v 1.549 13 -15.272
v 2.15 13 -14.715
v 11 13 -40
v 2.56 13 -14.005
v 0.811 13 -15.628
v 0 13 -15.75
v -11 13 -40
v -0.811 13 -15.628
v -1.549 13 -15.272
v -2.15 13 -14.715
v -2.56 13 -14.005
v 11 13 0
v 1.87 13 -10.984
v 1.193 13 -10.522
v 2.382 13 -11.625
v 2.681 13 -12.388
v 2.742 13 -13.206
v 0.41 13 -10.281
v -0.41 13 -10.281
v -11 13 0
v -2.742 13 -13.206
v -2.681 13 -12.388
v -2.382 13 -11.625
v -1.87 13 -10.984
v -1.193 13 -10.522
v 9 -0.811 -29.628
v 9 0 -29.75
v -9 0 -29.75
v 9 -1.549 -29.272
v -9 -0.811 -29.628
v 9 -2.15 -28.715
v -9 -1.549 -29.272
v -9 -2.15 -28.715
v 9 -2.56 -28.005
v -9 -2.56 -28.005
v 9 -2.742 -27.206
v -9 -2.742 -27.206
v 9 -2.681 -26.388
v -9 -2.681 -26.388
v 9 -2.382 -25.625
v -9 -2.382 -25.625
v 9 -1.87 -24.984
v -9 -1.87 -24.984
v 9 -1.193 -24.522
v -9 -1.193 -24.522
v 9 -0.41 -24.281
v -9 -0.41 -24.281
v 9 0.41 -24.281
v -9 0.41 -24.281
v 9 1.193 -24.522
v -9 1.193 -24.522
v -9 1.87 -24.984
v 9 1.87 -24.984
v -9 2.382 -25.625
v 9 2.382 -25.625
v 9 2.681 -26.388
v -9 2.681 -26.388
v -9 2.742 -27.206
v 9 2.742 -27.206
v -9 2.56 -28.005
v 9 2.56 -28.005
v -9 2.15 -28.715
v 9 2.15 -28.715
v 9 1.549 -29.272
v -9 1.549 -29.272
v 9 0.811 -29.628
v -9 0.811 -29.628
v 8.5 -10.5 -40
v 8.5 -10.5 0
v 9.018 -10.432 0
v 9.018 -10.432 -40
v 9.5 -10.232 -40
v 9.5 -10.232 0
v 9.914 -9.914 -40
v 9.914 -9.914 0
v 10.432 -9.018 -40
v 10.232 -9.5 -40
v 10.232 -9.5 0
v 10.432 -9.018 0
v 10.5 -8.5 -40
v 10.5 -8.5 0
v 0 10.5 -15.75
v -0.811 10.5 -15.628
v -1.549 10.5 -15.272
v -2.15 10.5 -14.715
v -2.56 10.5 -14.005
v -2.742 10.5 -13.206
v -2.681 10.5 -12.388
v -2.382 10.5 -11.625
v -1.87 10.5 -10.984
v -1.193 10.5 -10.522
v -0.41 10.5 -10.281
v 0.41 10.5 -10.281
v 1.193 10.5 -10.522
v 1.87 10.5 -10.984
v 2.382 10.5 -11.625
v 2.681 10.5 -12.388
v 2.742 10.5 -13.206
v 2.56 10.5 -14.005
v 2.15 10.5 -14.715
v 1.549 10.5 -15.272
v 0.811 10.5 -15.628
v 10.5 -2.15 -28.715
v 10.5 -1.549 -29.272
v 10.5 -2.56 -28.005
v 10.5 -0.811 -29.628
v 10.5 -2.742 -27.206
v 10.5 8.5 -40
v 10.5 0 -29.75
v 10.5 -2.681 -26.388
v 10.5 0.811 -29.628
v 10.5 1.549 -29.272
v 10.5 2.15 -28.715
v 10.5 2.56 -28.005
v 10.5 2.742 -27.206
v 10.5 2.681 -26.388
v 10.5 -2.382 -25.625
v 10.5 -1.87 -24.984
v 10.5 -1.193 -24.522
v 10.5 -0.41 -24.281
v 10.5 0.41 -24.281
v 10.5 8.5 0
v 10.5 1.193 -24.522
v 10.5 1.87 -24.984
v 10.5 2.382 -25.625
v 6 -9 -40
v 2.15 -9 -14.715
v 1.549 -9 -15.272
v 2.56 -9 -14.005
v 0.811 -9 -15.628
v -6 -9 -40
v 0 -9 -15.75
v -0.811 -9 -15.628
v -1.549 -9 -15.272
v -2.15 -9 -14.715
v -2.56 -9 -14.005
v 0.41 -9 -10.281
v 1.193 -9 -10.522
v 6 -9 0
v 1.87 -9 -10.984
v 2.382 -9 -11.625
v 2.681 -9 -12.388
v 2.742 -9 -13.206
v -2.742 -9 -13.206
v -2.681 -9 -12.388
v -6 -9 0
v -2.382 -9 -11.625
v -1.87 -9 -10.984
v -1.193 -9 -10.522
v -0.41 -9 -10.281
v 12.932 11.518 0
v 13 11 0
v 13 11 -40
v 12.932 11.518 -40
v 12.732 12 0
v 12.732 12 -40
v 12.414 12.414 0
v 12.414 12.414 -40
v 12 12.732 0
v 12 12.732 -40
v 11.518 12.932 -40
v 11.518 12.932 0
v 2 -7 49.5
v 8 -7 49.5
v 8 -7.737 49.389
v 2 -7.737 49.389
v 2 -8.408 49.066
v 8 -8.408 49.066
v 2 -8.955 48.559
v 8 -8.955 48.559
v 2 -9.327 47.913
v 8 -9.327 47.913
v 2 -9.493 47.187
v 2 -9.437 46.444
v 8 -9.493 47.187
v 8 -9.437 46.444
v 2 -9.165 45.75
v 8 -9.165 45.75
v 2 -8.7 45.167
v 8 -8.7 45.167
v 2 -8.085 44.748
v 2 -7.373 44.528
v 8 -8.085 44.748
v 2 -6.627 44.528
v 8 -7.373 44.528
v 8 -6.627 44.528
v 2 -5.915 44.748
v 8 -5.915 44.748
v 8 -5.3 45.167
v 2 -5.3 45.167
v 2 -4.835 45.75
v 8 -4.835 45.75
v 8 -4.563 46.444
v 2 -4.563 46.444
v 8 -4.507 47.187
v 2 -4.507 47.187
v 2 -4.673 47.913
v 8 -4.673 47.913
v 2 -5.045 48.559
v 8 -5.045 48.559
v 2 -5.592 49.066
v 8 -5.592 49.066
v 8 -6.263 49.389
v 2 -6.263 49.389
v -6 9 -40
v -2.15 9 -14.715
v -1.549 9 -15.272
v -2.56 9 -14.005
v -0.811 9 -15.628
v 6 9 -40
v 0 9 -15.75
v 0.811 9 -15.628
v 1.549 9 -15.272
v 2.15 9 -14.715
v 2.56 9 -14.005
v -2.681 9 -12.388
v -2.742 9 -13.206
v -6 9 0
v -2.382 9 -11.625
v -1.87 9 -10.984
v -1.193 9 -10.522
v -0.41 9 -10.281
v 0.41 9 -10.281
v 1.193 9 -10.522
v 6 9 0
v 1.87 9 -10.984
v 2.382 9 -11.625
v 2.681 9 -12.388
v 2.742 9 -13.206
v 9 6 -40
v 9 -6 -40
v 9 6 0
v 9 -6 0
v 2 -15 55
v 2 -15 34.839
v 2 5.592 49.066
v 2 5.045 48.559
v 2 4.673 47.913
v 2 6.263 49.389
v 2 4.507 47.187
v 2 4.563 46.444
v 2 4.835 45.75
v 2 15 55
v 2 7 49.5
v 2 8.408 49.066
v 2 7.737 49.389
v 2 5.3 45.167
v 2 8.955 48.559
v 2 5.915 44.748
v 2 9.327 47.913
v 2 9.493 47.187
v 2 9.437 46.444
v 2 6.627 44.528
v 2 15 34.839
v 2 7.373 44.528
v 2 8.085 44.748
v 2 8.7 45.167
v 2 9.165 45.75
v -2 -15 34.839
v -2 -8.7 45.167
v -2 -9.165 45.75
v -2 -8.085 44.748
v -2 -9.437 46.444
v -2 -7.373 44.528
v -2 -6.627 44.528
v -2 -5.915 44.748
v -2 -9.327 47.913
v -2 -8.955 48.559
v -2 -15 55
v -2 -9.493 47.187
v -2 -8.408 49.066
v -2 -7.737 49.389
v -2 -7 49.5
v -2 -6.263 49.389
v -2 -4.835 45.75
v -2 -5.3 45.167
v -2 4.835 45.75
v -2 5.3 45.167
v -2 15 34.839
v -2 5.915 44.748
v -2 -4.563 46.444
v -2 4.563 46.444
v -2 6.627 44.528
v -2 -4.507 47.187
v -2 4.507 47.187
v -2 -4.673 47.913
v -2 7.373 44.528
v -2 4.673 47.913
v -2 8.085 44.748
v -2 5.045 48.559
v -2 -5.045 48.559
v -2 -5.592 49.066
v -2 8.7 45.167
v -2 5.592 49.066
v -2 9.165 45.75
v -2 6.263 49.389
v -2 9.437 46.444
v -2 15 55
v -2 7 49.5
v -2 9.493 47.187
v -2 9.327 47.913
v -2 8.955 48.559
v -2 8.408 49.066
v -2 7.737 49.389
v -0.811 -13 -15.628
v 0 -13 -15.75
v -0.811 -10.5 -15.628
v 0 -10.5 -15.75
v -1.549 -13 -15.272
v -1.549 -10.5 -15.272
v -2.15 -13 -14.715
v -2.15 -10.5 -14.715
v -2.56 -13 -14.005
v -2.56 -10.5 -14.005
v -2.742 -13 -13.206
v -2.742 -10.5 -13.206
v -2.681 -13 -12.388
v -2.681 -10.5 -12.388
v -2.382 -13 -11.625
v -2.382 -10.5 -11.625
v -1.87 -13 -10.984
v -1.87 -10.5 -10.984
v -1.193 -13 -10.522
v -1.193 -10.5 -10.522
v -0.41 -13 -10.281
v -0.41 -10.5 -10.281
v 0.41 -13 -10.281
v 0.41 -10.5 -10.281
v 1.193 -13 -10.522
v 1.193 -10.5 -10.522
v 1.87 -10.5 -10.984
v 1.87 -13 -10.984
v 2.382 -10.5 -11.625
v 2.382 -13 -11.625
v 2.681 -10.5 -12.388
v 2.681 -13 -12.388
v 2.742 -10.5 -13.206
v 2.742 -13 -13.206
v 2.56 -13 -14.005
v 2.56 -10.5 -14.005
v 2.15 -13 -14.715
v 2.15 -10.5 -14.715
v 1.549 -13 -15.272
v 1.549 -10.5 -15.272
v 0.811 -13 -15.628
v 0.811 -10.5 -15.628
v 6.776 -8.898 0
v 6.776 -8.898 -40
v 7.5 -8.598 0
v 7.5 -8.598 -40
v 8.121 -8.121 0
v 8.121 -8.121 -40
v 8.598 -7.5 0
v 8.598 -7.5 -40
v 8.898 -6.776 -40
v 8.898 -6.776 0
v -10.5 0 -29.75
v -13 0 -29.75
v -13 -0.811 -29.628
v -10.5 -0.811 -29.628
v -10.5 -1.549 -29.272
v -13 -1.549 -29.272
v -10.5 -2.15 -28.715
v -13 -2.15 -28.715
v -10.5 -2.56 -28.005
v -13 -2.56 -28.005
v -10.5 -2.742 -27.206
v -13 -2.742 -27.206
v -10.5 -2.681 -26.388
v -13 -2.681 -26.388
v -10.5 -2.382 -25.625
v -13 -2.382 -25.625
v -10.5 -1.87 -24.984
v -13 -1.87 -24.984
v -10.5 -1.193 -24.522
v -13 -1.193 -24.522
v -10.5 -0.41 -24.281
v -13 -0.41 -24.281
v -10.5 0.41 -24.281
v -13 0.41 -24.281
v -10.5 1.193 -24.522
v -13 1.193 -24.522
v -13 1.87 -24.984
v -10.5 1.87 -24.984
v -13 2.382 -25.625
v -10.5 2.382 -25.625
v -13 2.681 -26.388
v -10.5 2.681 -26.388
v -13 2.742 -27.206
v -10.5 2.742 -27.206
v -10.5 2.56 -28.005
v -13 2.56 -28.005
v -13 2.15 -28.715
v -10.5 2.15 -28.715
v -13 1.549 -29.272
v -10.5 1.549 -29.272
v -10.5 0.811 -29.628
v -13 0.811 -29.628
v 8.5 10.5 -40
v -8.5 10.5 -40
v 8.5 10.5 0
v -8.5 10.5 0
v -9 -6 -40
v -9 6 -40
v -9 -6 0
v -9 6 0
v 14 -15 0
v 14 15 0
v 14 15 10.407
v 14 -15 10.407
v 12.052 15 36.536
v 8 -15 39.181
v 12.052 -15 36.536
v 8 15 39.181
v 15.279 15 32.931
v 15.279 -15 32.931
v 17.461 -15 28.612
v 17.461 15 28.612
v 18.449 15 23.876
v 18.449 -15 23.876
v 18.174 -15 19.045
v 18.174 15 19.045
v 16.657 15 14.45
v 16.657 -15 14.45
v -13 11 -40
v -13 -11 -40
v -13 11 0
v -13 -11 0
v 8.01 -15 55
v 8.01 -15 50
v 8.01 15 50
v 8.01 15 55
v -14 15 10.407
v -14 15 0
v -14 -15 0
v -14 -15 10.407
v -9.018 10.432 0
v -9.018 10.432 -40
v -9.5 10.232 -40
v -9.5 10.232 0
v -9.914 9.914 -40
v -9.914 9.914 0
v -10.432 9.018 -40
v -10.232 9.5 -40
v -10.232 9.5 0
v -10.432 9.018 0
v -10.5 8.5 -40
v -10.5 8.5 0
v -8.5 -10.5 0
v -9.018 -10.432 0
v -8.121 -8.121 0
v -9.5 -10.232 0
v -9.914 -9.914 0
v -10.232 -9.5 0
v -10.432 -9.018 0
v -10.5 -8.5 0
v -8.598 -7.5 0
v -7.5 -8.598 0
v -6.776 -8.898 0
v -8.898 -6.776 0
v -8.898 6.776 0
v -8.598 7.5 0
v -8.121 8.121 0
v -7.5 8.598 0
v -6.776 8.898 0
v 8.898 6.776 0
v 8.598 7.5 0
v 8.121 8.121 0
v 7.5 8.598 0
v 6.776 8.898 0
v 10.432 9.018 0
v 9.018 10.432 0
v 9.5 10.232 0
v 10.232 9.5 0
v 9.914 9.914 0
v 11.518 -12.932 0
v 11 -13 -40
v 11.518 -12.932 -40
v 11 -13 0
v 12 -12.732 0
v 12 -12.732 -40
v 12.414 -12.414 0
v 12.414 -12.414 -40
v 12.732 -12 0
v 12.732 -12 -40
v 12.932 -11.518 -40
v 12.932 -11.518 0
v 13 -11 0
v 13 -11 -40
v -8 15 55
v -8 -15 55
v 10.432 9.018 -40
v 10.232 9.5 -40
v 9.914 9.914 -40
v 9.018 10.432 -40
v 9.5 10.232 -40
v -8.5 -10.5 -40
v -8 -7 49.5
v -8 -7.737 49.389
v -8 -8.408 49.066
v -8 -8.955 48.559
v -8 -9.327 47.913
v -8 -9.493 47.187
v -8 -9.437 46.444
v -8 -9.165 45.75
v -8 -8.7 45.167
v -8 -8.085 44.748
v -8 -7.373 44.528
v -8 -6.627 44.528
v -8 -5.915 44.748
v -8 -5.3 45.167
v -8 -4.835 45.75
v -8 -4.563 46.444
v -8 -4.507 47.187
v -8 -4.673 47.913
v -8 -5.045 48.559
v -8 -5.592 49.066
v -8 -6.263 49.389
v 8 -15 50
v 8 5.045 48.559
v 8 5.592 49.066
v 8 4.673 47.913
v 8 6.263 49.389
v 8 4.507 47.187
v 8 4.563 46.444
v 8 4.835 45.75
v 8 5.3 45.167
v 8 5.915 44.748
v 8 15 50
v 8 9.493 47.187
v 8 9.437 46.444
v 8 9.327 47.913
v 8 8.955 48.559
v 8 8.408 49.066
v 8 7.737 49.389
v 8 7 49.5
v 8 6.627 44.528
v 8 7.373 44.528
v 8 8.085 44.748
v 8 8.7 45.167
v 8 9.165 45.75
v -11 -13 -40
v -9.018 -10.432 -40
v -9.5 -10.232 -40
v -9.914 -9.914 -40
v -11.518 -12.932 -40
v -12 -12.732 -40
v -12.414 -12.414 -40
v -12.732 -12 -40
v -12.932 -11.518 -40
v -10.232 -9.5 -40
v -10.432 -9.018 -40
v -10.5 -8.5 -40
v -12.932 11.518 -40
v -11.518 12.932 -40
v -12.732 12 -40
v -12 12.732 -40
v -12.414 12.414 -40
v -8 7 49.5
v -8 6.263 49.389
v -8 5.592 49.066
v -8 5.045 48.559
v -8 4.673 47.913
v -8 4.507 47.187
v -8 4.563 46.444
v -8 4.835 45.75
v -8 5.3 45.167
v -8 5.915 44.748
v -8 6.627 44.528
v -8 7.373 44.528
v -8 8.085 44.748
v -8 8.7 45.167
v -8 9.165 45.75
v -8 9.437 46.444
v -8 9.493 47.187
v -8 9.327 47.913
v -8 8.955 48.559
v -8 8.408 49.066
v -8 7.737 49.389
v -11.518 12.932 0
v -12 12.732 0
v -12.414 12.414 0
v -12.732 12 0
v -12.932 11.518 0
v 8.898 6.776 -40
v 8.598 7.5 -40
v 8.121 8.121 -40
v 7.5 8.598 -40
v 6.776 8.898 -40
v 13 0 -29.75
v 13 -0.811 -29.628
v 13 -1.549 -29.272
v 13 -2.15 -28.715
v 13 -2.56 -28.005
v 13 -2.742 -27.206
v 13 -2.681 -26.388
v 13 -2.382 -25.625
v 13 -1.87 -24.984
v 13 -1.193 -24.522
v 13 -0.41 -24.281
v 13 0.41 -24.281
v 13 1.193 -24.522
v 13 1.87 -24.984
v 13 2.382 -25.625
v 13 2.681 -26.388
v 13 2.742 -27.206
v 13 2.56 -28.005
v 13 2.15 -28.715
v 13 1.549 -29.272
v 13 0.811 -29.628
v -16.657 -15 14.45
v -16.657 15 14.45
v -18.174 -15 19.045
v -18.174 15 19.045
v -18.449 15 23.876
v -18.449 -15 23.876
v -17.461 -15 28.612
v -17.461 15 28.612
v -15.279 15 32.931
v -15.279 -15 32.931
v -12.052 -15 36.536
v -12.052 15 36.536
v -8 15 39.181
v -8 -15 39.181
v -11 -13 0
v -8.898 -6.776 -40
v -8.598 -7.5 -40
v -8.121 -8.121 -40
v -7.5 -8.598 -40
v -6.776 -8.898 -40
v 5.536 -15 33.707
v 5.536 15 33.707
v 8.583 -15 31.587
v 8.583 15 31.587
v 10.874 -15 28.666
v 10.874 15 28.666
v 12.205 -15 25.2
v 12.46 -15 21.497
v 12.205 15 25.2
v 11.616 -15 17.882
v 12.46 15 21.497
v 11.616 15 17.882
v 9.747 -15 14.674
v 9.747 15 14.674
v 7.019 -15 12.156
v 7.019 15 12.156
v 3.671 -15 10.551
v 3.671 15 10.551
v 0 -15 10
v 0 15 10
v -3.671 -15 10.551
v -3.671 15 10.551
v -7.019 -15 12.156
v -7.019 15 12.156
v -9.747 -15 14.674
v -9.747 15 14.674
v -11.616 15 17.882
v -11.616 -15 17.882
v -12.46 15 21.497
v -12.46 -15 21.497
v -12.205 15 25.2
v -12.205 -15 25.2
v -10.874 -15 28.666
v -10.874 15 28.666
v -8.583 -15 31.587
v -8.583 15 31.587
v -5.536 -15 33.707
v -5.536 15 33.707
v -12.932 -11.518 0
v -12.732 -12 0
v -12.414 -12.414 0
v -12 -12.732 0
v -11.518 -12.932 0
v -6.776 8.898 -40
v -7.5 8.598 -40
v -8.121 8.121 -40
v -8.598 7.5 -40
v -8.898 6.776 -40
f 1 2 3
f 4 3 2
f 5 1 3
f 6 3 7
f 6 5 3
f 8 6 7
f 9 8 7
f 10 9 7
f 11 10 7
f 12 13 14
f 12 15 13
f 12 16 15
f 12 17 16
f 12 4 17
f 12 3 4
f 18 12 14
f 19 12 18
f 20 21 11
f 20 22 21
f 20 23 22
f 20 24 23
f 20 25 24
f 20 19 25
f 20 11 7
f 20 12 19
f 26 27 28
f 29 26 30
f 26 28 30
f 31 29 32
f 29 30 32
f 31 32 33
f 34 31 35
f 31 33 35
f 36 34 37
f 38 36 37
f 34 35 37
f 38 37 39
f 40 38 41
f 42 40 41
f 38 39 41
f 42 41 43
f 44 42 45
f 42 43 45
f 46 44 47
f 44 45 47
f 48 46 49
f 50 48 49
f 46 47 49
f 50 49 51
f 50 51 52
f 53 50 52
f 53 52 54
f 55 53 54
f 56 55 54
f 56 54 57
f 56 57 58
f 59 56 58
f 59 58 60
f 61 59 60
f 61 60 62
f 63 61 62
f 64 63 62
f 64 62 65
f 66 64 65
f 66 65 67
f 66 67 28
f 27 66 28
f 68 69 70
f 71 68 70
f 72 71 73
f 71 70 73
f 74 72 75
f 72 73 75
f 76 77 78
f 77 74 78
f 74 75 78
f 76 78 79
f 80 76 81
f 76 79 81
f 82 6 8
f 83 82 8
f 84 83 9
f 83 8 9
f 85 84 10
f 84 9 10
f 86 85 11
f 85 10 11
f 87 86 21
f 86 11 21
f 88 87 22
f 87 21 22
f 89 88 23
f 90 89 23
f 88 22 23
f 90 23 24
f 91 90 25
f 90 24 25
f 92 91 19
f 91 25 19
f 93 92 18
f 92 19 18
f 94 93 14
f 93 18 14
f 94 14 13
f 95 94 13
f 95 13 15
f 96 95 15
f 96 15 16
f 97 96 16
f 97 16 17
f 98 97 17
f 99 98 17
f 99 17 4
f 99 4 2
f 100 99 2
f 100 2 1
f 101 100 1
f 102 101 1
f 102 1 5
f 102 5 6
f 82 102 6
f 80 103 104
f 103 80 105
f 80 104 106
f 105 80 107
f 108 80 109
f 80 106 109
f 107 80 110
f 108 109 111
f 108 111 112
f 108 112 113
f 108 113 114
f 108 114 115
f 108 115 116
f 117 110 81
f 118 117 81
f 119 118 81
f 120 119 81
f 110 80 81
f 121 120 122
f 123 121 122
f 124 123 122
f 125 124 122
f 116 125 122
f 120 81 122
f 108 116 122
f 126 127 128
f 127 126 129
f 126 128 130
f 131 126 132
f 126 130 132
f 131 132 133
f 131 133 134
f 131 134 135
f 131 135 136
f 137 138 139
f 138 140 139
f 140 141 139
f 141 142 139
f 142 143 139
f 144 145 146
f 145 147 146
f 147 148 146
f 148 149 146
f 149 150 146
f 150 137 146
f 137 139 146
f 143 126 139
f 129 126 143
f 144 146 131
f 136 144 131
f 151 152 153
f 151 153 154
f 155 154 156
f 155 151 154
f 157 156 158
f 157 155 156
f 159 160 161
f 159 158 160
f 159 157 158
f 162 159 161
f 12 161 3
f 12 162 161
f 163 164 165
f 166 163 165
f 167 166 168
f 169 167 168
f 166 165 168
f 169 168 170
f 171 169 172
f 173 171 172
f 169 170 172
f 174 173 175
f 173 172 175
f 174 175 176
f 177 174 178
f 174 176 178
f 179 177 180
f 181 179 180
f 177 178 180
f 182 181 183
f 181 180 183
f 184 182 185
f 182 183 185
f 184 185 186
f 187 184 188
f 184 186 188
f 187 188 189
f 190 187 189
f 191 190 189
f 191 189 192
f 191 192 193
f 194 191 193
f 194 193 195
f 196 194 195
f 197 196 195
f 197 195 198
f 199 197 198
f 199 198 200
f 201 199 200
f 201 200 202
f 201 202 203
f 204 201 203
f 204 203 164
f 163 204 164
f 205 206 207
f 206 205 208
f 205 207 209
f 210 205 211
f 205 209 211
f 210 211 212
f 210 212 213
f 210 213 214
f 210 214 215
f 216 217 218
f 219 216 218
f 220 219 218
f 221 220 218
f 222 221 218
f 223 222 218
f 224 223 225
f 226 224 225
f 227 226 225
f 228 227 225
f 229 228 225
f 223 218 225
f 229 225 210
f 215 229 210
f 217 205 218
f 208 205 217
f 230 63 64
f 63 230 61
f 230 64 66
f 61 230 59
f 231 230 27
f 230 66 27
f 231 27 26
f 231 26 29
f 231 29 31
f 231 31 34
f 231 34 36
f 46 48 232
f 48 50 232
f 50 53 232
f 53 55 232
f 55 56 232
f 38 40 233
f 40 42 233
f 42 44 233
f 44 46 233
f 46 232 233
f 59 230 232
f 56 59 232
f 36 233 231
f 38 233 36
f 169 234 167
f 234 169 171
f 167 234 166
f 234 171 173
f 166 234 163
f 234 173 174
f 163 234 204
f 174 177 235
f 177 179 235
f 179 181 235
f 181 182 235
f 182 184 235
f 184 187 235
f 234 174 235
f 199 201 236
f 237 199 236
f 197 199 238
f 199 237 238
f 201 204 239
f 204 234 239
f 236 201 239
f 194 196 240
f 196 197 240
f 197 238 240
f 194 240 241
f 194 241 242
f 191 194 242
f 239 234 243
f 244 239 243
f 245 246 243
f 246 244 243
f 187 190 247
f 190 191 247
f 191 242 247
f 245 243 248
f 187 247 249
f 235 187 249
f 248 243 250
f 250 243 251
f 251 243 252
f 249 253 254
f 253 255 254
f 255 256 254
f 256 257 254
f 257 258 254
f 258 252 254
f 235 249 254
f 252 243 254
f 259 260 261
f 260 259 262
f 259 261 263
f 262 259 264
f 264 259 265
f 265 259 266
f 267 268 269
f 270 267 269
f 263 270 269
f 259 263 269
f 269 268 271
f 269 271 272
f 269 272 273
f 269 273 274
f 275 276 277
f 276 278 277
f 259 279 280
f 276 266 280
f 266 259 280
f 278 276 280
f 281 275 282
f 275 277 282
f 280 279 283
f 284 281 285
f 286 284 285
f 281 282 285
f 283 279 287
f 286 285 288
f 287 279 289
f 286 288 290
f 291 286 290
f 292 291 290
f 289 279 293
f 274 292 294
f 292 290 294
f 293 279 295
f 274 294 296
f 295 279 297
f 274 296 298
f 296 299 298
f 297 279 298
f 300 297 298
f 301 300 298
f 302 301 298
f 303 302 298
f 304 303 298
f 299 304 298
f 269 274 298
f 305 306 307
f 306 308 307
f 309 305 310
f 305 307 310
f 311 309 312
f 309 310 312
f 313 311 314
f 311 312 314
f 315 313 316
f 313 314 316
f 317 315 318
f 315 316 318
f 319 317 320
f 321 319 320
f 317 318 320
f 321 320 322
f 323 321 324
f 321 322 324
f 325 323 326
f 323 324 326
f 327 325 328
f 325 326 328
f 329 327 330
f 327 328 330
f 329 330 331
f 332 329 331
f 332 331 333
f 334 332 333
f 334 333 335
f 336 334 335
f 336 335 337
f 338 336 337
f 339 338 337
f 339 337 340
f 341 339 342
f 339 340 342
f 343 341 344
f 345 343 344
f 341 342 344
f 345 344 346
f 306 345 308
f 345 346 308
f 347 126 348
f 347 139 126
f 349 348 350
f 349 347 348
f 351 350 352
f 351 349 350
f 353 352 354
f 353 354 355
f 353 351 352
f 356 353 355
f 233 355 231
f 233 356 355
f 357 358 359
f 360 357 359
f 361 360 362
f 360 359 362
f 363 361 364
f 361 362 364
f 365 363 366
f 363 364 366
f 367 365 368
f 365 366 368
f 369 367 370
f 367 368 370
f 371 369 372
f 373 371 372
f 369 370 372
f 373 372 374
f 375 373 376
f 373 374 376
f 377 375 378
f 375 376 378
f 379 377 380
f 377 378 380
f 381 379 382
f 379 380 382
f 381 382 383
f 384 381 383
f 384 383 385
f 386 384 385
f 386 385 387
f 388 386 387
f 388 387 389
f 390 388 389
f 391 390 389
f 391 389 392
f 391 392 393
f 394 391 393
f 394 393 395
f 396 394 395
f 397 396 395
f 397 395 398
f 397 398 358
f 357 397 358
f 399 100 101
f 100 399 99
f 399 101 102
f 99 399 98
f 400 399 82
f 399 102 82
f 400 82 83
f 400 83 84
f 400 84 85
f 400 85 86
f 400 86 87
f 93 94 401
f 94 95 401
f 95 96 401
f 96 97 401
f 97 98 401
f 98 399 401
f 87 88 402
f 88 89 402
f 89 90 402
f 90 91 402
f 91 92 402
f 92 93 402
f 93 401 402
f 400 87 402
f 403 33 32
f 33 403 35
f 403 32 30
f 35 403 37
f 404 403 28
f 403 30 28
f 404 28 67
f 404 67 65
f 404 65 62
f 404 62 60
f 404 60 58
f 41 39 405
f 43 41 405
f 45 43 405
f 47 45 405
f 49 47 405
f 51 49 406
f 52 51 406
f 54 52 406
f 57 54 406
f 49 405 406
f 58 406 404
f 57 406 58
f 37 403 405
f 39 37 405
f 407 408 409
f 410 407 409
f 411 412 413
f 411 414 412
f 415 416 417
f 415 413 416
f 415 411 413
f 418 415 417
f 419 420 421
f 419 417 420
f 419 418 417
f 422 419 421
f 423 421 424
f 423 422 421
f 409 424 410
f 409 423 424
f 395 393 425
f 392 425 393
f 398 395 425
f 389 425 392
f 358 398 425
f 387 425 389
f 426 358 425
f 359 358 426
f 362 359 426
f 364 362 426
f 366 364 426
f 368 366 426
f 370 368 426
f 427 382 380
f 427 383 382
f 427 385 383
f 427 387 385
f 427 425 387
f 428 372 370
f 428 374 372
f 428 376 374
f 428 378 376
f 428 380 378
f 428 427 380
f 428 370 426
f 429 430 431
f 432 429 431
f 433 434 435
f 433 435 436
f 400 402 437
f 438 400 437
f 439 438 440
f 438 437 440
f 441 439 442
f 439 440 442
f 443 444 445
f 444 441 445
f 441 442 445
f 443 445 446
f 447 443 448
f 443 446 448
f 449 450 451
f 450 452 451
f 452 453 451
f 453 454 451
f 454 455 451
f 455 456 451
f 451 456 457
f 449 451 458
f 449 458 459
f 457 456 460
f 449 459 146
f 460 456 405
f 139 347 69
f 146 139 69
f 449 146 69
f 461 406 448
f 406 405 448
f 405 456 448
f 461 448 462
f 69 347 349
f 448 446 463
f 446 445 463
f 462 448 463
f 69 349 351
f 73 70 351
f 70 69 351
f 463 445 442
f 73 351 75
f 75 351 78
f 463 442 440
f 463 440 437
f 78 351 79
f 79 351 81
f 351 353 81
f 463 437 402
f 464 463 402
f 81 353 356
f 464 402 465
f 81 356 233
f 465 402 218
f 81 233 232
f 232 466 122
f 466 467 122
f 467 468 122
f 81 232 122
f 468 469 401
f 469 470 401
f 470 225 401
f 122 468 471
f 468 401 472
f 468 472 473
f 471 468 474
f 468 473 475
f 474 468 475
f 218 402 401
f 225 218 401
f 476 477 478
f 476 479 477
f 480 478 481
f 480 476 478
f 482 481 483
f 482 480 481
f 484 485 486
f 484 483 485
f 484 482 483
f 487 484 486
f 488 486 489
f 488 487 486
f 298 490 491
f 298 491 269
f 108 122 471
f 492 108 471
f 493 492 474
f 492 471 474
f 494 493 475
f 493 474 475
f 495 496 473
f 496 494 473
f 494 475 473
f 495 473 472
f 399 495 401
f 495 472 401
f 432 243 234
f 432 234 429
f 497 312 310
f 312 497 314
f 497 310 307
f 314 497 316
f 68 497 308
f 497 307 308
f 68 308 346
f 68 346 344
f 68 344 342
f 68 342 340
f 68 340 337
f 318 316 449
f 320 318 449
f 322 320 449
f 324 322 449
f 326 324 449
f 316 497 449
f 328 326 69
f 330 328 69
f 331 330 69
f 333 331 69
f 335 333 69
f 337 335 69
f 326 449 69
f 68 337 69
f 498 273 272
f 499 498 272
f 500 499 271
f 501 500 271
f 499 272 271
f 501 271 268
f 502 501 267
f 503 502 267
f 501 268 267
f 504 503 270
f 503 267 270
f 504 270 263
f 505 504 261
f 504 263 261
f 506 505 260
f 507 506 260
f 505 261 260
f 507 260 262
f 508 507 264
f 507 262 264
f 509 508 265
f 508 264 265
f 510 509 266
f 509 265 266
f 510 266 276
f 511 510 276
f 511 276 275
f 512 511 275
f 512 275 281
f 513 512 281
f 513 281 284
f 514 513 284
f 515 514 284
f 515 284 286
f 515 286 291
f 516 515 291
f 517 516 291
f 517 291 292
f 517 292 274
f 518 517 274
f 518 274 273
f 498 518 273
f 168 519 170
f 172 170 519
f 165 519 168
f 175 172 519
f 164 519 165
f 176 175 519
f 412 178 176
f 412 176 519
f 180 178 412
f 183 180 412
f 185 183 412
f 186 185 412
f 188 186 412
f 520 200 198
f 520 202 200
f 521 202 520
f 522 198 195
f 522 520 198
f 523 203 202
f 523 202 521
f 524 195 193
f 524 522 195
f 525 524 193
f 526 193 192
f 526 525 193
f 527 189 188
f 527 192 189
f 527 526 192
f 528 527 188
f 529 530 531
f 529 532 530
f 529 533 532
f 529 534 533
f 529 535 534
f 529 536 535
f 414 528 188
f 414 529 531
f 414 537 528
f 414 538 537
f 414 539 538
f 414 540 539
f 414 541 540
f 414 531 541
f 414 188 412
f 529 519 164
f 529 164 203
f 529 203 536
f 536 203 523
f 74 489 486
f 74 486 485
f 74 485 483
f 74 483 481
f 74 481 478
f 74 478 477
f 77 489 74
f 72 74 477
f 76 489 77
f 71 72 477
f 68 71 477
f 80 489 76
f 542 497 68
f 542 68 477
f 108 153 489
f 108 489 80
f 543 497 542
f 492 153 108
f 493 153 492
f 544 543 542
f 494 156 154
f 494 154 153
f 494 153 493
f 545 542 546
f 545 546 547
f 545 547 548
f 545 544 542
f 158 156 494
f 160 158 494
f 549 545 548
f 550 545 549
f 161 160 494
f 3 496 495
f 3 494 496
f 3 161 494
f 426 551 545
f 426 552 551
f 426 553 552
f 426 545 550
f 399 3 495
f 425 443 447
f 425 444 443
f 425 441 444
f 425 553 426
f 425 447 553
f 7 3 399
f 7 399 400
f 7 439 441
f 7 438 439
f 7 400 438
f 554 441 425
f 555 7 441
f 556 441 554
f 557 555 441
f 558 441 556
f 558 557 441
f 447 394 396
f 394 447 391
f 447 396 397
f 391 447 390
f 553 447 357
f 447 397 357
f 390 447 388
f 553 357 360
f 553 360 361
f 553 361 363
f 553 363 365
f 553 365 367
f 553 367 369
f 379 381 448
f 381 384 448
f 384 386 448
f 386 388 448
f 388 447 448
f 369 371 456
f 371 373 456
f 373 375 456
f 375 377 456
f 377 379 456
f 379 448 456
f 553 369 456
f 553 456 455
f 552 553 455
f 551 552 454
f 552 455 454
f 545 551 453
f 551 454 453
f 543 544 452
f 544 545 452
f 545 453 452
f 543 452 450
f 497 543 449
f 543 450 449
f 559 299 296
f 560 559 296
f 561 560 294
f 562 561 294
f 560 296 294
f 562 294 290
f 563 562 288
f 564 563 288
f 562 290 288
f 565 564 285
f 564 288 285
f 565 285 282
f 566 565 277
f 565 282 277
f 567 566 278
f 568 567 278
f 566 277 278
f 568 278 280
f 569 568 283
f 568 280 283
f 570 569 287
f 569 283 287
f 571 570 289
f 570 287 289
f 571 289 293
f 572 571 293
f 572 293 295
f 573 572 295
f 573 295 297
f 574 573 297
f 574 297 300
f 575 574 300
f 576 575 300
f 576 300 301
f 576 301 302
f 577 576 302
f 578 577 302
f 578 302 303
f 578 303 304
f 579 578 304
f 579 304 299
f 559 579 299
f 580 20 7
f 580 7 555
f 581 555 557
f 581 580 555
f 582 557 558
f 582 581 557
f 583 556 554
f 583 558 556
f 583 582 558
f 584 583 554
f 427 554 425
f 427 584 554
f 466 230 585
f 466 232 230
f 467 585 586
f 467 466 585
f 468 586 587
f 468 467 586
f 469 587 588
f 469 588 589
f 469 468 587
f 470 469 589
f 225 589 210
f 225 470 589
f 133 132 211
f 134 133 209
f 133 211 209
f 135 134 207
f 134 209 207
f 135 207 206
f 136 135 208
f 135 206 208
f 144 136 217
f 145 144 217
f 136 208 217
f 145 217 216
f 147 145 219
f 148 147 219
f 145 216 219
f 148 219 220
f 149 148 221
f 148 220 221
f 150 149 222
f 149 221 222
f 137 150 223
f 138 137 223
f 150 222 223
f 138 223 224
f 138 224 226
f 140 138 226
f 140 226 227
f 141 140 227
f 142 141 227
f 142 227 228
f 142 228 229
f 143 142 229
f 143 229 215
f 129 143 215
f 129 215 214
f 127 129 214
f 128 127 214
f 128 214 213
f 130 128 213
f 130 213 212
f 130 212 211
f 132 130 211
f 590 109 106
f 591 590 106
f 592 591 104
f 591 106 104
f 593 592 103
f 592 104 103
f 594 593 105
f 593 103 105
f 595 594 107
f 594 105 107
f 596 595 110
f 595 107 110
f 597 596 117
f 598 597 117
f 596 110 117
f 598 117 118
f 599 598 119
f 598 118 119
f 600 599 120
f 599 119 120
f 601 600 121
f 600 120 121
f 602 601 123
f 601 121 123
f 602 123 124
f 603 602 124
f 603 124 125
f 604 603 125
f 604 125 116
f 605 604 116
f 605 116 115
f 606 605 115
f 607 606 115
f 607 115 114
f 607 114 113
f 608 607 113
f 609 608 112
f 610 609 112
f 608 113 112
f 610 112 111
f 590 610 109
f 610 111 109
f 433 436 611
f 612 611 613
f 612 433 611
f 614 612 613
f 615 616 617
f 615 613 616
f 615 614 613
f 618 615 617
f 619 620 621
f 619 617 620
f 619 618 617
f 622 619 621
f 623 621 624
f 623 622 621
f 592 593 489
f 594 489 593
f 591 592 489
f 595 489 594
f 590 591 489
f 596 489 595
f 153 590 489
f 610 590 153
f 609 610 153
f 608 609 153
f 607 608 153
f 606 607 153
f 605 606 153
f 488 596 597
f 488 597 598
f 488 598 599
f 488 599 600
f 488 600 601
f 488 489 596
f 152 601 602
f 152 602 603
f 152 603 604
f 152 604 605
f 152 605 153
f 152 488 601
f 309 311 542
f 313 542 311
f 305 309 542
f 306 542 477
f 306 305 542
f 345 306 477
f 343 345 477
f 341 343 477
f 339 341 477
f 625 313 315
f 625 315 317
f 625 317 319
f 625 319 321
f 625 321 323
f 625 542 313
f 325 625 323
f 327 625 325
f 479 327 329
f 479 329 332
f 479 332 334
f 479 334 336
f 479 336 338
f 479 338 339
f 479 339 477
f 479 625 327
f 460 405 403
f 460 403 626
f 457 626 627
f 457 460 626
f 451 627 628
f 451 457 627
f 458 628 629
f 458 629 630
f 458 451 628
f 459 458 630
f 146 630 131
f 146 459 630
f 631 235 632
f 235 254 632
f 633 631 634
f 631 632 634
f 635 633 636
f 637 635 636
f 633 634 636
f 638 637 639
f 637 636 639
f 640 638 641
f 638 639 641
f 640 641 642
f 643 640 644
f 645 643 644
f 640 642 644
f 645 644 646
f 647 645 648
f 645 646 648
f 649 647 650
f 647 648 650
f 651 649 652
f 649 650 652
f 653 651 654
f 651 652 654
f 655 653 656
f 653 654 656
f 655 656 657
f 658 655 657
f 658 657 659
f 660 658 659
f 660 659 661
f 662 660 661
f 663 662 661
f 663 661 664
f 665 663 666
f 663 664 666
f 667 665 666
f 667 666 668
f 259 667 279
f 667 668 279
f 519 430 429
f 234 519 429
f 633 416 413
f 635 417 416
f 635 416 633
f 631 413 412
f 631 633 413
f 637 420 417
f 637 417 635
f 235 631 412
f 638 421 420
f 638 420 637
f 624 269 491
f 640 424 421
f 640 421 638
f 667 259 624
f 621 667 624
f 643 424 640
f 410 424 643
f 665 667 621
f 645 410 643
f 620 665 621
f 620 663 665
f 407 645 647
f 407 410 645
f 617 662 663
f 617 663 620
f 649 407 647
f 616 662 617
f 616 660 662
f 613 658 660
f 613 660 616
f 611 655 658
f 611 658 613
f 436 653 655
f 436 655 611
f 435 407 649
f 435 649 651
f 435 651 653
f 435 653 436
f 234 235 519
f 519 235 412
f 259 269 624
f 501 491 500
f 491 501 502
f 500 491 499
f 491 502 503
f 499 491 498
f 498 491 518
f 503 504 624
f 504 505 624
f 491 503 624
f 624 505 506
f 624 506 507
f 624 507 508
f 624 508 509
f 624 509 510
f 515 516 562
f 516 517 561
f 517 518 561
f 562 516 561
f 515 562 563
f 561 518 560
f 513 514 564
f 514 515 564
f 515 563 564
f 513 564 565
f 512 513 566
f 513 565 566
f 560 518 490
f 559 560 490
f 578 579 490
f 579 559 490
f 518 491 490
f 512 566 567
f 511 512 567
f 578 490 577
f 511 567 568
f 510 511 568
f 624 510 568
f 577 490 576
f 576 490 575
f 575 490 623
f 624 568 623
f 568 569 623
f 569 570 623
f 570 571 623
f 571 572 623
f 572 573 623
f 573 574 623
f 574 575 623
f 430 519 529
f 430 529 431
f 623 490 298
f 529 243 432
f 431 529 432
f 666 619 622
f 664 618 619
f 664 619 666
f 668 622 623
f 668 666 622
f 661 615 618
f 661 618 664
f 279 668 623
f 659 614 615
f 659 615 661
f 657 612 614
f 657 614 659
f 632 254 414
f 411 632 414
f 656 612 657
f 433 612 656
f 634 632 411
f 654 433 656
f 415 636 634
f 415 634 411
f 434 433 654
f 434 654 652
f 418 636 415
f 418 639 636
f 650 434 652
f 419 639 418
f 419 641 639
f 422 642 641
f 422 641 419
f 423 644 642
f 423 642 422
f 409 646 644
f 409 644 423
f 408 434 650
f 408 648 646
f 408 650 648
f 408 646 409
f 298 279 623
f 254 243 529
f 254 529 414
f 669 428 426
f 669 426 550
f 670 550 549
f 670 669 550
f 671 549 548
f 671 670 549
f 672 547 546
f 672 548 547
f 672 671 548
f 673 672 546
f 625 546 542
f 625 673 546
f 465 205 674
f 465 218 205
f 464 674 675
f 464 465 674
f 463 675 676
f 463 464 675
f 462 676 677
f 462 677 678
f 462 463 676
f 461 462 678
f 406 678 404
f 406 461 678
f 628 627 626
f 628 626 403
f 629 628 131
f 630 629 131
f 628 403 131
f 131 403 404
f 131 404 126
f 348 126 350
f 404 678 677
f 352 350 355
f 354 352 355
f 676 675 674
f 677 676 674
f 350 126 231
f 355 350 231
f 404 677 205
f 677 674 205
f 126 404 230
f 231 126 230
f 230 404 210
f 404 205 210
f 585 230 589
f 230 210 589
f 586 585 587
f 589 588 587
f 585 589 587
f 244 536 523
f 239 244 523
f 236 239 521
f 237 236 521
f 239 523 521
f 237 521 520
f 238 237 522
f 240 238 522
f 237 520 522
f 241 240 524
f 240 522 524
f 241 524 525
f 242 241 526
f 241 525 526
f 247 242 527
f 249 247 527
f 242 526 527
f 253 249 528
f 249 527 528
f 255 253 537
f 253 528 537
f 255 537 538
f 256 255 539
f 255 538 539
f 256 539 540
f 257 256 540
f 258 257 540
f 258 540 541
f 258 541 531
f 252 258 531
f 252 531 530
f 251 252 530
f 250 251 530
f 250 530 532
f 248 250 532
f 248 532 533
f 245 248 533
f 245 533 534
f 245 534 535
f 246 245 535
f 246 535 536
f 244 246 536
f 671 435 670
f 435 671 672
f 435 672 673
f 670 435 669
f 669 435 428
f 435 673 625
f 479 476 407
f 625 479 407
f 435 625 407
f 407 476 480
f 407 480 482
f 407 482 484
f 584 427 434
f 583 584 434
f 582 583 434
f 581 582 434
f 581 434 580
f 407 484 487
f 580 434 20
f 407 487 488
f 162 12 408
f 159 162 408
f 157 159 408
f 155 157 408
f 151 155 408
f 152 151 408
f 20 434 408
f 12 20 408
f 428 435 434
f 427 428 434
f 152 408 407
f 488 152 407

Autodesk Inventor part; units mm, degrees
ref_plane "YZ Plane" through (0, 0, 0) normal (1, 0, 0) x (0, 1, 0)
ref_plane "XZ Plane" through (0, 0, 0) normal (0, 1, 0) x (-1, 0, 0)
ref_plane "XY Plane" through (0, 0, 0) normal (0, 0, 1) x (1, 0, 0)
sketch "Schizzo1" plane through (0, 0, 0) normal (0, 0, 1) x (1, 0, 0)
  line L0 (9, 6) -> (9, -6)
  line L1 (6, -9) -> (-6, -9)
  line L2 (-9, -6) -> (-9, 6)
  line L3 (-6, 9) -> (6, 9)
  arc A0 (-6, 9) -> (-9, 6) centre (-6, 6) ccw
  arc A1 (-9, -6) -> (-6, -9) centre (-6, -6) ccw
  arc A2 (6, -9) -> (9, -6) centre (6, -6) ccw
  arc A3 (9, 6) -> (6, 9) centre (6, 6) ccw
  point P0 (0, 0)
  point P1 (0, 0)
  point P2 (9, 9)
  point P3 (9, -9)
  point P4 (-9, -9)
  point P5 (-9, 9)
  dimension "d0" = 18
  dimension "d72" = 3
extrude "Estrusione1" add sketch "Schizzo1" against normal blind 40
sketch "Schizzo2" plane through (0, 0, 0) normal (0, 0, 1) x (1, 0, 0)
  line L0 (18.5, -15) -> (-18.5, -15)
  line L1 (-18.5, -15) -> (-18.5, 15)
  line L2 (-18.5, 15) -> (18.5, 15)
  line L3 (18.5, 15) -> (18.5, -15)
  line L4 (18.5, -15) -> (-18.5, 15) construction
  line L5 (-18.5, -15) -> (18.5, 15) construction
  point P0 (0, 0)
  dimension "d3" = 30
  dimension "d4" = 37
extrude "Estrusione2" add sketch "Schizzo2" along normal blind 50
sketch "Schizzo3" plane through (-18.5, 15, 0) normal (0, 1, 0) x (1, 0, 0)
  line L0 (18.5, 0) -> (18.5, -22.5)
  line L1 (18.5, 0) -> (41, 0) construction
  circle A0 centre (18.5, -22.5) radius 12.5
  dimension "d7" = 22.5
  dimension "d8" = 90
  dimension "d9" = 25
extrude "Estrusione3" cut sketch "Schizzo3" against normal blind 30
sketch "Schizzo4" plane through (-18.5, 15, 0) normal (0, 1, 0) x (1, 0, 0)
  circle A0 centre (18.5, -22.5) radius 12.5 projected
  line L0 (18.5, -22.5) -> (18.5, -34.5)
  line L1 (18.5, -34.5) -> (15, -34.5)
  line L2 (18.5, -34.5) -> (22, -34.5)
  line L3 (0, -50) -> (37, -50) projected
  line L4 (18.5, -50) -> (20.5, -50)
  line L5 (18.5, -50) -> (20.5, -50) construction
  line L6 (20.5, -50) -> (20.5, -34.5)
  line L7 (18.5, -50) -> (16.5, -50)
  line L8 (16.5, -50) -> (20.5, -50)
  line L9 (20.5, -50) -> (20.5, -34.5)
  line L10 (20.5, -34.5) -> (16.5, -34.5)
  line L11 (16.5, -34.5) -> (16.5, -50)
  point P0 (18.5, 0)
  point P1 (16.5, -34.839)
  point P2 (20.5, -34.839)
  dimension "d12" = 12
  dimension "d13" = 2
  dimension "d14" = 0
  dimension "d15" = 2
extrude "Estrusione4" cut sketch "Schizzo4" against normal blind 30 contours A0 L6 L3 L11
sketch "Schizzo5" plane through (-18.5, 15, 0) normal (0, 1, 0) x (1, 0, 0)
  arc A0 (20.5, -34.839) -> (16.5, -34.839) centre (18.5, -22.5) ccw projected
  circle A1 centre (18.5, -22.5) radius 18.5
  line L0 (20.5, -50) -> (20.5, -34.839) projected
  line L1 (20.5, -50) -> (26.5, -50)
  line L2 (37, -50) -> (20.5, -50) projected
  line L3 (26.5, -50) -> (26.5, -39.1808)
  line L4 (37, 0) -> (37, -50) projected
  line L5 (26.5, -50) -> (37, -50)
  line L6 (37, -50) -> (37, -22.5)
  point P0 (18.5, 0)
  dimension "d18" = 37
  dimension "d19" = 6
extrude "Estrusione5" cut sketch "Schizzo5" against normal blind 30 contours A1 L4 L2 L3
sketch "Schizzo6" plane through (-18.5, 15, 0) normal (0, 1, 0) x (1, 0, 0)
  line L0 (16.5, -50) -> (0, -50) projected
  line L1 (16.5, -50) -> (10.5, -50)
  arc A0 (20.5, -34.839) -> (16.5, -34.839) centre (18.5, -22.5) ccw projected
  circle A1 centre (18.5, -22.5) radius 18.5
  line L2 (0, 0) -> (0, -50) projected
  line L3 (10.5, -50) -> (0, -50)
  line L4 (0, -50) -> (0, -22.5)
  line L5 (10.5, -50) -> (10.5, -39.1808)
  line L6 (10.5, -50) -> (21.3192, -50) construction
  point P0 (18.5, 0)
  dimension "d22" = 6
  dimension "d23" = 37
  dimension "d24" = 90
extrude "Estrusione6" cut sketch "Schizzo6" against normal blind 30 contours L0 L2 A1 L5
sketch "Schizzo7" plane through (-18.5, 15, 0) normal (0, 1, 0) x (1, 0, 0)
  arc A0 (20.5, -34.839) -> (16.5, -34.839) centre (18.5, -22.5) ccw projected
  line L0 (0, 0) -> (0, -22.5)
  circle A1 centre (18.5, -22.5) radius 18.5
  line L1 (18.5, 0) -> (4.5, 0)
  line L2 (37, 0) -> (0, 0) projected
  line L3 (18.5, 0) -> (32.5, 0) construction
  line L4 (4.5, 0) -> (4.5, -10.4066)
  dimension "d73" = 37
  dimension "d74" = 14
  dimension "d75" = 180
  dimension "d76" = 90
extrude "Estrusione7" cut sketch "Schizzo7" against normal blind 30 contours L2 L4 A1 L0
sketch "Schizzo8" plane through (0, 15, 22.5) normal (0, 1, 0) x (1, 0, 0)
  line L0 (-6, 22.5) -> (6, 22.5) projected
  arc A0 (2, -12.339) -> (-2, -12.339) centre (0, 0) ccw projected
  circle A1 centre (0, 0) radius 18.5
  line L1 (0, 22.5) -> (14, 22.5)
  line L2 (0, 22.5) -> (14, 22.5) construction
  line L3 (14, 22.5) -> (14, 12.0934)
  line L4 (-18.5, 22.5) -> (18.5, 22.5) projected
  line L5 (14, 22.5) -> (18.5, 22.5)
  line L6 (18.5, 22.5) -> (18.5, 0)
  point P0 (-9, 22.5)
  point P1 (9, 22.5)
  point P2 (-14, 22.5)
  dimension "d35" = 37
  dimension "d36" = 14
  dimension "d38" = 90
extrude "Estrusione8" cut sketch "Schizzo8" against normal blind 30 contours A1 L3 L4 L6
sketch "Schizzo10" plane through (0, 0, 50) normal (0, 0, 1) x (1, 0, 0)
  line L0 (-8, 15) -> (-8, -15) projected
  line L1 (-8, -15) -> (8.0102, -15)
  line L2 (8.0102, -15) -> (8.0102, 15)
  line L3 (8.0102, 15) -> (-8, 15)
  line L4 (-8, 15) -> (-8, -15)
  line L5 (-8, -15) -> (-2, -15) projected
  line L6 (2, 15) -> (2, -15) projected
  line L7 (-2, -15) -> (2, -15)
  line L8 (2, -15) -> (2, 15)
  line L9 (2, 15) -> (-2, 15)
  line L10 (-2, 15) -> (-2, -15)
  point P0 (0, 0)
  point P1 (-8, 15)
extrude "Estrusione9" add sketch "Schizzo10" along normal blind 5 contours L3 L10 L1 L0 | L3 L2 L1 L6
sketch "Schizzo11" plane through (-8, -15, 39.1808) normal (-1, 0, 0) x (0, 0, 1)
  line L0 (15.8192, 0) -> (15.8192, 30) projected
  line L1 (15.8192, 15) -> (7.8192, 15)
  line L2 (7.8192, 15) -> (7.8192, 22)
  line L3 (7.8192, 15) -> (7.8192, 8)
  line L4 (10.8192, 0) -> (10.8192, 30) projected
  line L5 (7.8192, 15) -> (14.8192, 15) construction
  point P0 (-39.1808, 15)
  dimension "d43" = 8
  dimension "d44" = 7
  dimension "d45" = 7
  dimension "d46" = 90
hole "Foro1" at (-8, 7, 47) at (-8, -7, 47) direction (1, 0, 0) diameter 5 end through all
sketch "Schizzo14" plane through (0, 0, 0) normal (0, 0, -1) x (-1, 0, 0)
  line L0 (10.5, 8.5) -> (10.5, -8.5)
  line L1 (8.5, -10.5) -> (-8.5, -10.5)
  line L2 (-10.5, -8.5) -> (-10.5, 8.5)
  line L3 (-8.5, 10.5) -> (8.5, 10.5)
  line L4 (13, 11) -> (13, -11)
  line L5 (11, -13) -> (-11, -13)
  line L6 (-13, -11) -> (-13, 11)
  line L7 (-11, 13) -> (11, 13)
  arc A0 (-8.5, 10.5) -> (-10.5, 8.5) centre (-8.5, 8.5) ccw
  arc A1 (8.5, -10.5) -> (10.5, -8.5) centre (8.5, -8.5) ccw
  arc A2 (-10.5, -8.5) -> (-8.5, -10.5) centre (-8.5, -8.5) ccw
  arc A3 (10.5, 8.5) -> (8.5, 10.5) centre (8.5, 8.5) ccw
  arc A4 (-11, 13) -> (-13, 11) centre (-11, 11) ccw
  arc A5 (13, 11) -> (11, 13) centre (11, 11) ccw
  arc A6 (11, -13) -> (13, -11) centre (11, -11) ccw
  arc A7 (-13, -11) -> (-11, -13) centre (-11, -11) ccw
  point P0 (0, 0)
  point P1 (0, 0)
  point P2 (10.5, 10.5)
  point P3 (10.5, -10.5)
  point P4 (-10.5, -10.5)
  point P5 (-10.5, 10.5)
  point P6 (0, 0)
  point P7 (13, 13)
  point P8 (13, -13)
  point P9 (-13, -13)
  point P10 (-13, 13)
  dimension "d77" = 21
  dimension "d78" = 26
  dimension "d79" = 2
extrude "Estrusione10" add sketch "Schizzo14" along normal blind 40
sketch "Schizzo15" plane through (0, 15, 22.5) normal (0, 1, 0) x (1, 0, 0)
  line L0 (-13, 12.5) -> (13, 12.5)
  line L1 (13, 12.5) -> (13, 17.5)
  line L2 (13, 17.5) -> (-13, 17.5)
  line L3 (-13, 17.5) -> (-13, 12.5)
  arc A0 (2, -12.339) -> (-2, -12.339) centre (0, 0) ccw projected
  point P0 (0, 22.5)
  point P1 (0, 12.5)
  dimension "d82" = 26
  dimension "d83" = 5
extrude "Estrusione11" [suppressed]
sketch "Schizzo16" plane through (-11, -13, 0) normal (0, -1, 0) x (1, 0, 0)
  line L0 (11, 0) -> (11, -13)
  dimension "d88" = 13
hole "Foro4" at (0, -13, -13) direction (0, 1, 0) diameter 5.5 depth 26 clearance for "Vite a testa esagonale" size "M5" standard "ANSI - Profilo M Metrico"
sketch "Schizzo17" plane through (13, -11, 0) normal (1, 0, 0) x (0, 0, -1)
  line L0 (0, 11) -> (27, 11)
  dimension "d96" = 27
hole "Foro5" at (13, 0, -27) direction (-1, 0, 0) diameter 5.5 depth 26 clearance for "Vite a testa esagonale" size "M5" standard "ANSI - Profilo M Metrico"
properties part number "5_Connettore_sup_inf"
